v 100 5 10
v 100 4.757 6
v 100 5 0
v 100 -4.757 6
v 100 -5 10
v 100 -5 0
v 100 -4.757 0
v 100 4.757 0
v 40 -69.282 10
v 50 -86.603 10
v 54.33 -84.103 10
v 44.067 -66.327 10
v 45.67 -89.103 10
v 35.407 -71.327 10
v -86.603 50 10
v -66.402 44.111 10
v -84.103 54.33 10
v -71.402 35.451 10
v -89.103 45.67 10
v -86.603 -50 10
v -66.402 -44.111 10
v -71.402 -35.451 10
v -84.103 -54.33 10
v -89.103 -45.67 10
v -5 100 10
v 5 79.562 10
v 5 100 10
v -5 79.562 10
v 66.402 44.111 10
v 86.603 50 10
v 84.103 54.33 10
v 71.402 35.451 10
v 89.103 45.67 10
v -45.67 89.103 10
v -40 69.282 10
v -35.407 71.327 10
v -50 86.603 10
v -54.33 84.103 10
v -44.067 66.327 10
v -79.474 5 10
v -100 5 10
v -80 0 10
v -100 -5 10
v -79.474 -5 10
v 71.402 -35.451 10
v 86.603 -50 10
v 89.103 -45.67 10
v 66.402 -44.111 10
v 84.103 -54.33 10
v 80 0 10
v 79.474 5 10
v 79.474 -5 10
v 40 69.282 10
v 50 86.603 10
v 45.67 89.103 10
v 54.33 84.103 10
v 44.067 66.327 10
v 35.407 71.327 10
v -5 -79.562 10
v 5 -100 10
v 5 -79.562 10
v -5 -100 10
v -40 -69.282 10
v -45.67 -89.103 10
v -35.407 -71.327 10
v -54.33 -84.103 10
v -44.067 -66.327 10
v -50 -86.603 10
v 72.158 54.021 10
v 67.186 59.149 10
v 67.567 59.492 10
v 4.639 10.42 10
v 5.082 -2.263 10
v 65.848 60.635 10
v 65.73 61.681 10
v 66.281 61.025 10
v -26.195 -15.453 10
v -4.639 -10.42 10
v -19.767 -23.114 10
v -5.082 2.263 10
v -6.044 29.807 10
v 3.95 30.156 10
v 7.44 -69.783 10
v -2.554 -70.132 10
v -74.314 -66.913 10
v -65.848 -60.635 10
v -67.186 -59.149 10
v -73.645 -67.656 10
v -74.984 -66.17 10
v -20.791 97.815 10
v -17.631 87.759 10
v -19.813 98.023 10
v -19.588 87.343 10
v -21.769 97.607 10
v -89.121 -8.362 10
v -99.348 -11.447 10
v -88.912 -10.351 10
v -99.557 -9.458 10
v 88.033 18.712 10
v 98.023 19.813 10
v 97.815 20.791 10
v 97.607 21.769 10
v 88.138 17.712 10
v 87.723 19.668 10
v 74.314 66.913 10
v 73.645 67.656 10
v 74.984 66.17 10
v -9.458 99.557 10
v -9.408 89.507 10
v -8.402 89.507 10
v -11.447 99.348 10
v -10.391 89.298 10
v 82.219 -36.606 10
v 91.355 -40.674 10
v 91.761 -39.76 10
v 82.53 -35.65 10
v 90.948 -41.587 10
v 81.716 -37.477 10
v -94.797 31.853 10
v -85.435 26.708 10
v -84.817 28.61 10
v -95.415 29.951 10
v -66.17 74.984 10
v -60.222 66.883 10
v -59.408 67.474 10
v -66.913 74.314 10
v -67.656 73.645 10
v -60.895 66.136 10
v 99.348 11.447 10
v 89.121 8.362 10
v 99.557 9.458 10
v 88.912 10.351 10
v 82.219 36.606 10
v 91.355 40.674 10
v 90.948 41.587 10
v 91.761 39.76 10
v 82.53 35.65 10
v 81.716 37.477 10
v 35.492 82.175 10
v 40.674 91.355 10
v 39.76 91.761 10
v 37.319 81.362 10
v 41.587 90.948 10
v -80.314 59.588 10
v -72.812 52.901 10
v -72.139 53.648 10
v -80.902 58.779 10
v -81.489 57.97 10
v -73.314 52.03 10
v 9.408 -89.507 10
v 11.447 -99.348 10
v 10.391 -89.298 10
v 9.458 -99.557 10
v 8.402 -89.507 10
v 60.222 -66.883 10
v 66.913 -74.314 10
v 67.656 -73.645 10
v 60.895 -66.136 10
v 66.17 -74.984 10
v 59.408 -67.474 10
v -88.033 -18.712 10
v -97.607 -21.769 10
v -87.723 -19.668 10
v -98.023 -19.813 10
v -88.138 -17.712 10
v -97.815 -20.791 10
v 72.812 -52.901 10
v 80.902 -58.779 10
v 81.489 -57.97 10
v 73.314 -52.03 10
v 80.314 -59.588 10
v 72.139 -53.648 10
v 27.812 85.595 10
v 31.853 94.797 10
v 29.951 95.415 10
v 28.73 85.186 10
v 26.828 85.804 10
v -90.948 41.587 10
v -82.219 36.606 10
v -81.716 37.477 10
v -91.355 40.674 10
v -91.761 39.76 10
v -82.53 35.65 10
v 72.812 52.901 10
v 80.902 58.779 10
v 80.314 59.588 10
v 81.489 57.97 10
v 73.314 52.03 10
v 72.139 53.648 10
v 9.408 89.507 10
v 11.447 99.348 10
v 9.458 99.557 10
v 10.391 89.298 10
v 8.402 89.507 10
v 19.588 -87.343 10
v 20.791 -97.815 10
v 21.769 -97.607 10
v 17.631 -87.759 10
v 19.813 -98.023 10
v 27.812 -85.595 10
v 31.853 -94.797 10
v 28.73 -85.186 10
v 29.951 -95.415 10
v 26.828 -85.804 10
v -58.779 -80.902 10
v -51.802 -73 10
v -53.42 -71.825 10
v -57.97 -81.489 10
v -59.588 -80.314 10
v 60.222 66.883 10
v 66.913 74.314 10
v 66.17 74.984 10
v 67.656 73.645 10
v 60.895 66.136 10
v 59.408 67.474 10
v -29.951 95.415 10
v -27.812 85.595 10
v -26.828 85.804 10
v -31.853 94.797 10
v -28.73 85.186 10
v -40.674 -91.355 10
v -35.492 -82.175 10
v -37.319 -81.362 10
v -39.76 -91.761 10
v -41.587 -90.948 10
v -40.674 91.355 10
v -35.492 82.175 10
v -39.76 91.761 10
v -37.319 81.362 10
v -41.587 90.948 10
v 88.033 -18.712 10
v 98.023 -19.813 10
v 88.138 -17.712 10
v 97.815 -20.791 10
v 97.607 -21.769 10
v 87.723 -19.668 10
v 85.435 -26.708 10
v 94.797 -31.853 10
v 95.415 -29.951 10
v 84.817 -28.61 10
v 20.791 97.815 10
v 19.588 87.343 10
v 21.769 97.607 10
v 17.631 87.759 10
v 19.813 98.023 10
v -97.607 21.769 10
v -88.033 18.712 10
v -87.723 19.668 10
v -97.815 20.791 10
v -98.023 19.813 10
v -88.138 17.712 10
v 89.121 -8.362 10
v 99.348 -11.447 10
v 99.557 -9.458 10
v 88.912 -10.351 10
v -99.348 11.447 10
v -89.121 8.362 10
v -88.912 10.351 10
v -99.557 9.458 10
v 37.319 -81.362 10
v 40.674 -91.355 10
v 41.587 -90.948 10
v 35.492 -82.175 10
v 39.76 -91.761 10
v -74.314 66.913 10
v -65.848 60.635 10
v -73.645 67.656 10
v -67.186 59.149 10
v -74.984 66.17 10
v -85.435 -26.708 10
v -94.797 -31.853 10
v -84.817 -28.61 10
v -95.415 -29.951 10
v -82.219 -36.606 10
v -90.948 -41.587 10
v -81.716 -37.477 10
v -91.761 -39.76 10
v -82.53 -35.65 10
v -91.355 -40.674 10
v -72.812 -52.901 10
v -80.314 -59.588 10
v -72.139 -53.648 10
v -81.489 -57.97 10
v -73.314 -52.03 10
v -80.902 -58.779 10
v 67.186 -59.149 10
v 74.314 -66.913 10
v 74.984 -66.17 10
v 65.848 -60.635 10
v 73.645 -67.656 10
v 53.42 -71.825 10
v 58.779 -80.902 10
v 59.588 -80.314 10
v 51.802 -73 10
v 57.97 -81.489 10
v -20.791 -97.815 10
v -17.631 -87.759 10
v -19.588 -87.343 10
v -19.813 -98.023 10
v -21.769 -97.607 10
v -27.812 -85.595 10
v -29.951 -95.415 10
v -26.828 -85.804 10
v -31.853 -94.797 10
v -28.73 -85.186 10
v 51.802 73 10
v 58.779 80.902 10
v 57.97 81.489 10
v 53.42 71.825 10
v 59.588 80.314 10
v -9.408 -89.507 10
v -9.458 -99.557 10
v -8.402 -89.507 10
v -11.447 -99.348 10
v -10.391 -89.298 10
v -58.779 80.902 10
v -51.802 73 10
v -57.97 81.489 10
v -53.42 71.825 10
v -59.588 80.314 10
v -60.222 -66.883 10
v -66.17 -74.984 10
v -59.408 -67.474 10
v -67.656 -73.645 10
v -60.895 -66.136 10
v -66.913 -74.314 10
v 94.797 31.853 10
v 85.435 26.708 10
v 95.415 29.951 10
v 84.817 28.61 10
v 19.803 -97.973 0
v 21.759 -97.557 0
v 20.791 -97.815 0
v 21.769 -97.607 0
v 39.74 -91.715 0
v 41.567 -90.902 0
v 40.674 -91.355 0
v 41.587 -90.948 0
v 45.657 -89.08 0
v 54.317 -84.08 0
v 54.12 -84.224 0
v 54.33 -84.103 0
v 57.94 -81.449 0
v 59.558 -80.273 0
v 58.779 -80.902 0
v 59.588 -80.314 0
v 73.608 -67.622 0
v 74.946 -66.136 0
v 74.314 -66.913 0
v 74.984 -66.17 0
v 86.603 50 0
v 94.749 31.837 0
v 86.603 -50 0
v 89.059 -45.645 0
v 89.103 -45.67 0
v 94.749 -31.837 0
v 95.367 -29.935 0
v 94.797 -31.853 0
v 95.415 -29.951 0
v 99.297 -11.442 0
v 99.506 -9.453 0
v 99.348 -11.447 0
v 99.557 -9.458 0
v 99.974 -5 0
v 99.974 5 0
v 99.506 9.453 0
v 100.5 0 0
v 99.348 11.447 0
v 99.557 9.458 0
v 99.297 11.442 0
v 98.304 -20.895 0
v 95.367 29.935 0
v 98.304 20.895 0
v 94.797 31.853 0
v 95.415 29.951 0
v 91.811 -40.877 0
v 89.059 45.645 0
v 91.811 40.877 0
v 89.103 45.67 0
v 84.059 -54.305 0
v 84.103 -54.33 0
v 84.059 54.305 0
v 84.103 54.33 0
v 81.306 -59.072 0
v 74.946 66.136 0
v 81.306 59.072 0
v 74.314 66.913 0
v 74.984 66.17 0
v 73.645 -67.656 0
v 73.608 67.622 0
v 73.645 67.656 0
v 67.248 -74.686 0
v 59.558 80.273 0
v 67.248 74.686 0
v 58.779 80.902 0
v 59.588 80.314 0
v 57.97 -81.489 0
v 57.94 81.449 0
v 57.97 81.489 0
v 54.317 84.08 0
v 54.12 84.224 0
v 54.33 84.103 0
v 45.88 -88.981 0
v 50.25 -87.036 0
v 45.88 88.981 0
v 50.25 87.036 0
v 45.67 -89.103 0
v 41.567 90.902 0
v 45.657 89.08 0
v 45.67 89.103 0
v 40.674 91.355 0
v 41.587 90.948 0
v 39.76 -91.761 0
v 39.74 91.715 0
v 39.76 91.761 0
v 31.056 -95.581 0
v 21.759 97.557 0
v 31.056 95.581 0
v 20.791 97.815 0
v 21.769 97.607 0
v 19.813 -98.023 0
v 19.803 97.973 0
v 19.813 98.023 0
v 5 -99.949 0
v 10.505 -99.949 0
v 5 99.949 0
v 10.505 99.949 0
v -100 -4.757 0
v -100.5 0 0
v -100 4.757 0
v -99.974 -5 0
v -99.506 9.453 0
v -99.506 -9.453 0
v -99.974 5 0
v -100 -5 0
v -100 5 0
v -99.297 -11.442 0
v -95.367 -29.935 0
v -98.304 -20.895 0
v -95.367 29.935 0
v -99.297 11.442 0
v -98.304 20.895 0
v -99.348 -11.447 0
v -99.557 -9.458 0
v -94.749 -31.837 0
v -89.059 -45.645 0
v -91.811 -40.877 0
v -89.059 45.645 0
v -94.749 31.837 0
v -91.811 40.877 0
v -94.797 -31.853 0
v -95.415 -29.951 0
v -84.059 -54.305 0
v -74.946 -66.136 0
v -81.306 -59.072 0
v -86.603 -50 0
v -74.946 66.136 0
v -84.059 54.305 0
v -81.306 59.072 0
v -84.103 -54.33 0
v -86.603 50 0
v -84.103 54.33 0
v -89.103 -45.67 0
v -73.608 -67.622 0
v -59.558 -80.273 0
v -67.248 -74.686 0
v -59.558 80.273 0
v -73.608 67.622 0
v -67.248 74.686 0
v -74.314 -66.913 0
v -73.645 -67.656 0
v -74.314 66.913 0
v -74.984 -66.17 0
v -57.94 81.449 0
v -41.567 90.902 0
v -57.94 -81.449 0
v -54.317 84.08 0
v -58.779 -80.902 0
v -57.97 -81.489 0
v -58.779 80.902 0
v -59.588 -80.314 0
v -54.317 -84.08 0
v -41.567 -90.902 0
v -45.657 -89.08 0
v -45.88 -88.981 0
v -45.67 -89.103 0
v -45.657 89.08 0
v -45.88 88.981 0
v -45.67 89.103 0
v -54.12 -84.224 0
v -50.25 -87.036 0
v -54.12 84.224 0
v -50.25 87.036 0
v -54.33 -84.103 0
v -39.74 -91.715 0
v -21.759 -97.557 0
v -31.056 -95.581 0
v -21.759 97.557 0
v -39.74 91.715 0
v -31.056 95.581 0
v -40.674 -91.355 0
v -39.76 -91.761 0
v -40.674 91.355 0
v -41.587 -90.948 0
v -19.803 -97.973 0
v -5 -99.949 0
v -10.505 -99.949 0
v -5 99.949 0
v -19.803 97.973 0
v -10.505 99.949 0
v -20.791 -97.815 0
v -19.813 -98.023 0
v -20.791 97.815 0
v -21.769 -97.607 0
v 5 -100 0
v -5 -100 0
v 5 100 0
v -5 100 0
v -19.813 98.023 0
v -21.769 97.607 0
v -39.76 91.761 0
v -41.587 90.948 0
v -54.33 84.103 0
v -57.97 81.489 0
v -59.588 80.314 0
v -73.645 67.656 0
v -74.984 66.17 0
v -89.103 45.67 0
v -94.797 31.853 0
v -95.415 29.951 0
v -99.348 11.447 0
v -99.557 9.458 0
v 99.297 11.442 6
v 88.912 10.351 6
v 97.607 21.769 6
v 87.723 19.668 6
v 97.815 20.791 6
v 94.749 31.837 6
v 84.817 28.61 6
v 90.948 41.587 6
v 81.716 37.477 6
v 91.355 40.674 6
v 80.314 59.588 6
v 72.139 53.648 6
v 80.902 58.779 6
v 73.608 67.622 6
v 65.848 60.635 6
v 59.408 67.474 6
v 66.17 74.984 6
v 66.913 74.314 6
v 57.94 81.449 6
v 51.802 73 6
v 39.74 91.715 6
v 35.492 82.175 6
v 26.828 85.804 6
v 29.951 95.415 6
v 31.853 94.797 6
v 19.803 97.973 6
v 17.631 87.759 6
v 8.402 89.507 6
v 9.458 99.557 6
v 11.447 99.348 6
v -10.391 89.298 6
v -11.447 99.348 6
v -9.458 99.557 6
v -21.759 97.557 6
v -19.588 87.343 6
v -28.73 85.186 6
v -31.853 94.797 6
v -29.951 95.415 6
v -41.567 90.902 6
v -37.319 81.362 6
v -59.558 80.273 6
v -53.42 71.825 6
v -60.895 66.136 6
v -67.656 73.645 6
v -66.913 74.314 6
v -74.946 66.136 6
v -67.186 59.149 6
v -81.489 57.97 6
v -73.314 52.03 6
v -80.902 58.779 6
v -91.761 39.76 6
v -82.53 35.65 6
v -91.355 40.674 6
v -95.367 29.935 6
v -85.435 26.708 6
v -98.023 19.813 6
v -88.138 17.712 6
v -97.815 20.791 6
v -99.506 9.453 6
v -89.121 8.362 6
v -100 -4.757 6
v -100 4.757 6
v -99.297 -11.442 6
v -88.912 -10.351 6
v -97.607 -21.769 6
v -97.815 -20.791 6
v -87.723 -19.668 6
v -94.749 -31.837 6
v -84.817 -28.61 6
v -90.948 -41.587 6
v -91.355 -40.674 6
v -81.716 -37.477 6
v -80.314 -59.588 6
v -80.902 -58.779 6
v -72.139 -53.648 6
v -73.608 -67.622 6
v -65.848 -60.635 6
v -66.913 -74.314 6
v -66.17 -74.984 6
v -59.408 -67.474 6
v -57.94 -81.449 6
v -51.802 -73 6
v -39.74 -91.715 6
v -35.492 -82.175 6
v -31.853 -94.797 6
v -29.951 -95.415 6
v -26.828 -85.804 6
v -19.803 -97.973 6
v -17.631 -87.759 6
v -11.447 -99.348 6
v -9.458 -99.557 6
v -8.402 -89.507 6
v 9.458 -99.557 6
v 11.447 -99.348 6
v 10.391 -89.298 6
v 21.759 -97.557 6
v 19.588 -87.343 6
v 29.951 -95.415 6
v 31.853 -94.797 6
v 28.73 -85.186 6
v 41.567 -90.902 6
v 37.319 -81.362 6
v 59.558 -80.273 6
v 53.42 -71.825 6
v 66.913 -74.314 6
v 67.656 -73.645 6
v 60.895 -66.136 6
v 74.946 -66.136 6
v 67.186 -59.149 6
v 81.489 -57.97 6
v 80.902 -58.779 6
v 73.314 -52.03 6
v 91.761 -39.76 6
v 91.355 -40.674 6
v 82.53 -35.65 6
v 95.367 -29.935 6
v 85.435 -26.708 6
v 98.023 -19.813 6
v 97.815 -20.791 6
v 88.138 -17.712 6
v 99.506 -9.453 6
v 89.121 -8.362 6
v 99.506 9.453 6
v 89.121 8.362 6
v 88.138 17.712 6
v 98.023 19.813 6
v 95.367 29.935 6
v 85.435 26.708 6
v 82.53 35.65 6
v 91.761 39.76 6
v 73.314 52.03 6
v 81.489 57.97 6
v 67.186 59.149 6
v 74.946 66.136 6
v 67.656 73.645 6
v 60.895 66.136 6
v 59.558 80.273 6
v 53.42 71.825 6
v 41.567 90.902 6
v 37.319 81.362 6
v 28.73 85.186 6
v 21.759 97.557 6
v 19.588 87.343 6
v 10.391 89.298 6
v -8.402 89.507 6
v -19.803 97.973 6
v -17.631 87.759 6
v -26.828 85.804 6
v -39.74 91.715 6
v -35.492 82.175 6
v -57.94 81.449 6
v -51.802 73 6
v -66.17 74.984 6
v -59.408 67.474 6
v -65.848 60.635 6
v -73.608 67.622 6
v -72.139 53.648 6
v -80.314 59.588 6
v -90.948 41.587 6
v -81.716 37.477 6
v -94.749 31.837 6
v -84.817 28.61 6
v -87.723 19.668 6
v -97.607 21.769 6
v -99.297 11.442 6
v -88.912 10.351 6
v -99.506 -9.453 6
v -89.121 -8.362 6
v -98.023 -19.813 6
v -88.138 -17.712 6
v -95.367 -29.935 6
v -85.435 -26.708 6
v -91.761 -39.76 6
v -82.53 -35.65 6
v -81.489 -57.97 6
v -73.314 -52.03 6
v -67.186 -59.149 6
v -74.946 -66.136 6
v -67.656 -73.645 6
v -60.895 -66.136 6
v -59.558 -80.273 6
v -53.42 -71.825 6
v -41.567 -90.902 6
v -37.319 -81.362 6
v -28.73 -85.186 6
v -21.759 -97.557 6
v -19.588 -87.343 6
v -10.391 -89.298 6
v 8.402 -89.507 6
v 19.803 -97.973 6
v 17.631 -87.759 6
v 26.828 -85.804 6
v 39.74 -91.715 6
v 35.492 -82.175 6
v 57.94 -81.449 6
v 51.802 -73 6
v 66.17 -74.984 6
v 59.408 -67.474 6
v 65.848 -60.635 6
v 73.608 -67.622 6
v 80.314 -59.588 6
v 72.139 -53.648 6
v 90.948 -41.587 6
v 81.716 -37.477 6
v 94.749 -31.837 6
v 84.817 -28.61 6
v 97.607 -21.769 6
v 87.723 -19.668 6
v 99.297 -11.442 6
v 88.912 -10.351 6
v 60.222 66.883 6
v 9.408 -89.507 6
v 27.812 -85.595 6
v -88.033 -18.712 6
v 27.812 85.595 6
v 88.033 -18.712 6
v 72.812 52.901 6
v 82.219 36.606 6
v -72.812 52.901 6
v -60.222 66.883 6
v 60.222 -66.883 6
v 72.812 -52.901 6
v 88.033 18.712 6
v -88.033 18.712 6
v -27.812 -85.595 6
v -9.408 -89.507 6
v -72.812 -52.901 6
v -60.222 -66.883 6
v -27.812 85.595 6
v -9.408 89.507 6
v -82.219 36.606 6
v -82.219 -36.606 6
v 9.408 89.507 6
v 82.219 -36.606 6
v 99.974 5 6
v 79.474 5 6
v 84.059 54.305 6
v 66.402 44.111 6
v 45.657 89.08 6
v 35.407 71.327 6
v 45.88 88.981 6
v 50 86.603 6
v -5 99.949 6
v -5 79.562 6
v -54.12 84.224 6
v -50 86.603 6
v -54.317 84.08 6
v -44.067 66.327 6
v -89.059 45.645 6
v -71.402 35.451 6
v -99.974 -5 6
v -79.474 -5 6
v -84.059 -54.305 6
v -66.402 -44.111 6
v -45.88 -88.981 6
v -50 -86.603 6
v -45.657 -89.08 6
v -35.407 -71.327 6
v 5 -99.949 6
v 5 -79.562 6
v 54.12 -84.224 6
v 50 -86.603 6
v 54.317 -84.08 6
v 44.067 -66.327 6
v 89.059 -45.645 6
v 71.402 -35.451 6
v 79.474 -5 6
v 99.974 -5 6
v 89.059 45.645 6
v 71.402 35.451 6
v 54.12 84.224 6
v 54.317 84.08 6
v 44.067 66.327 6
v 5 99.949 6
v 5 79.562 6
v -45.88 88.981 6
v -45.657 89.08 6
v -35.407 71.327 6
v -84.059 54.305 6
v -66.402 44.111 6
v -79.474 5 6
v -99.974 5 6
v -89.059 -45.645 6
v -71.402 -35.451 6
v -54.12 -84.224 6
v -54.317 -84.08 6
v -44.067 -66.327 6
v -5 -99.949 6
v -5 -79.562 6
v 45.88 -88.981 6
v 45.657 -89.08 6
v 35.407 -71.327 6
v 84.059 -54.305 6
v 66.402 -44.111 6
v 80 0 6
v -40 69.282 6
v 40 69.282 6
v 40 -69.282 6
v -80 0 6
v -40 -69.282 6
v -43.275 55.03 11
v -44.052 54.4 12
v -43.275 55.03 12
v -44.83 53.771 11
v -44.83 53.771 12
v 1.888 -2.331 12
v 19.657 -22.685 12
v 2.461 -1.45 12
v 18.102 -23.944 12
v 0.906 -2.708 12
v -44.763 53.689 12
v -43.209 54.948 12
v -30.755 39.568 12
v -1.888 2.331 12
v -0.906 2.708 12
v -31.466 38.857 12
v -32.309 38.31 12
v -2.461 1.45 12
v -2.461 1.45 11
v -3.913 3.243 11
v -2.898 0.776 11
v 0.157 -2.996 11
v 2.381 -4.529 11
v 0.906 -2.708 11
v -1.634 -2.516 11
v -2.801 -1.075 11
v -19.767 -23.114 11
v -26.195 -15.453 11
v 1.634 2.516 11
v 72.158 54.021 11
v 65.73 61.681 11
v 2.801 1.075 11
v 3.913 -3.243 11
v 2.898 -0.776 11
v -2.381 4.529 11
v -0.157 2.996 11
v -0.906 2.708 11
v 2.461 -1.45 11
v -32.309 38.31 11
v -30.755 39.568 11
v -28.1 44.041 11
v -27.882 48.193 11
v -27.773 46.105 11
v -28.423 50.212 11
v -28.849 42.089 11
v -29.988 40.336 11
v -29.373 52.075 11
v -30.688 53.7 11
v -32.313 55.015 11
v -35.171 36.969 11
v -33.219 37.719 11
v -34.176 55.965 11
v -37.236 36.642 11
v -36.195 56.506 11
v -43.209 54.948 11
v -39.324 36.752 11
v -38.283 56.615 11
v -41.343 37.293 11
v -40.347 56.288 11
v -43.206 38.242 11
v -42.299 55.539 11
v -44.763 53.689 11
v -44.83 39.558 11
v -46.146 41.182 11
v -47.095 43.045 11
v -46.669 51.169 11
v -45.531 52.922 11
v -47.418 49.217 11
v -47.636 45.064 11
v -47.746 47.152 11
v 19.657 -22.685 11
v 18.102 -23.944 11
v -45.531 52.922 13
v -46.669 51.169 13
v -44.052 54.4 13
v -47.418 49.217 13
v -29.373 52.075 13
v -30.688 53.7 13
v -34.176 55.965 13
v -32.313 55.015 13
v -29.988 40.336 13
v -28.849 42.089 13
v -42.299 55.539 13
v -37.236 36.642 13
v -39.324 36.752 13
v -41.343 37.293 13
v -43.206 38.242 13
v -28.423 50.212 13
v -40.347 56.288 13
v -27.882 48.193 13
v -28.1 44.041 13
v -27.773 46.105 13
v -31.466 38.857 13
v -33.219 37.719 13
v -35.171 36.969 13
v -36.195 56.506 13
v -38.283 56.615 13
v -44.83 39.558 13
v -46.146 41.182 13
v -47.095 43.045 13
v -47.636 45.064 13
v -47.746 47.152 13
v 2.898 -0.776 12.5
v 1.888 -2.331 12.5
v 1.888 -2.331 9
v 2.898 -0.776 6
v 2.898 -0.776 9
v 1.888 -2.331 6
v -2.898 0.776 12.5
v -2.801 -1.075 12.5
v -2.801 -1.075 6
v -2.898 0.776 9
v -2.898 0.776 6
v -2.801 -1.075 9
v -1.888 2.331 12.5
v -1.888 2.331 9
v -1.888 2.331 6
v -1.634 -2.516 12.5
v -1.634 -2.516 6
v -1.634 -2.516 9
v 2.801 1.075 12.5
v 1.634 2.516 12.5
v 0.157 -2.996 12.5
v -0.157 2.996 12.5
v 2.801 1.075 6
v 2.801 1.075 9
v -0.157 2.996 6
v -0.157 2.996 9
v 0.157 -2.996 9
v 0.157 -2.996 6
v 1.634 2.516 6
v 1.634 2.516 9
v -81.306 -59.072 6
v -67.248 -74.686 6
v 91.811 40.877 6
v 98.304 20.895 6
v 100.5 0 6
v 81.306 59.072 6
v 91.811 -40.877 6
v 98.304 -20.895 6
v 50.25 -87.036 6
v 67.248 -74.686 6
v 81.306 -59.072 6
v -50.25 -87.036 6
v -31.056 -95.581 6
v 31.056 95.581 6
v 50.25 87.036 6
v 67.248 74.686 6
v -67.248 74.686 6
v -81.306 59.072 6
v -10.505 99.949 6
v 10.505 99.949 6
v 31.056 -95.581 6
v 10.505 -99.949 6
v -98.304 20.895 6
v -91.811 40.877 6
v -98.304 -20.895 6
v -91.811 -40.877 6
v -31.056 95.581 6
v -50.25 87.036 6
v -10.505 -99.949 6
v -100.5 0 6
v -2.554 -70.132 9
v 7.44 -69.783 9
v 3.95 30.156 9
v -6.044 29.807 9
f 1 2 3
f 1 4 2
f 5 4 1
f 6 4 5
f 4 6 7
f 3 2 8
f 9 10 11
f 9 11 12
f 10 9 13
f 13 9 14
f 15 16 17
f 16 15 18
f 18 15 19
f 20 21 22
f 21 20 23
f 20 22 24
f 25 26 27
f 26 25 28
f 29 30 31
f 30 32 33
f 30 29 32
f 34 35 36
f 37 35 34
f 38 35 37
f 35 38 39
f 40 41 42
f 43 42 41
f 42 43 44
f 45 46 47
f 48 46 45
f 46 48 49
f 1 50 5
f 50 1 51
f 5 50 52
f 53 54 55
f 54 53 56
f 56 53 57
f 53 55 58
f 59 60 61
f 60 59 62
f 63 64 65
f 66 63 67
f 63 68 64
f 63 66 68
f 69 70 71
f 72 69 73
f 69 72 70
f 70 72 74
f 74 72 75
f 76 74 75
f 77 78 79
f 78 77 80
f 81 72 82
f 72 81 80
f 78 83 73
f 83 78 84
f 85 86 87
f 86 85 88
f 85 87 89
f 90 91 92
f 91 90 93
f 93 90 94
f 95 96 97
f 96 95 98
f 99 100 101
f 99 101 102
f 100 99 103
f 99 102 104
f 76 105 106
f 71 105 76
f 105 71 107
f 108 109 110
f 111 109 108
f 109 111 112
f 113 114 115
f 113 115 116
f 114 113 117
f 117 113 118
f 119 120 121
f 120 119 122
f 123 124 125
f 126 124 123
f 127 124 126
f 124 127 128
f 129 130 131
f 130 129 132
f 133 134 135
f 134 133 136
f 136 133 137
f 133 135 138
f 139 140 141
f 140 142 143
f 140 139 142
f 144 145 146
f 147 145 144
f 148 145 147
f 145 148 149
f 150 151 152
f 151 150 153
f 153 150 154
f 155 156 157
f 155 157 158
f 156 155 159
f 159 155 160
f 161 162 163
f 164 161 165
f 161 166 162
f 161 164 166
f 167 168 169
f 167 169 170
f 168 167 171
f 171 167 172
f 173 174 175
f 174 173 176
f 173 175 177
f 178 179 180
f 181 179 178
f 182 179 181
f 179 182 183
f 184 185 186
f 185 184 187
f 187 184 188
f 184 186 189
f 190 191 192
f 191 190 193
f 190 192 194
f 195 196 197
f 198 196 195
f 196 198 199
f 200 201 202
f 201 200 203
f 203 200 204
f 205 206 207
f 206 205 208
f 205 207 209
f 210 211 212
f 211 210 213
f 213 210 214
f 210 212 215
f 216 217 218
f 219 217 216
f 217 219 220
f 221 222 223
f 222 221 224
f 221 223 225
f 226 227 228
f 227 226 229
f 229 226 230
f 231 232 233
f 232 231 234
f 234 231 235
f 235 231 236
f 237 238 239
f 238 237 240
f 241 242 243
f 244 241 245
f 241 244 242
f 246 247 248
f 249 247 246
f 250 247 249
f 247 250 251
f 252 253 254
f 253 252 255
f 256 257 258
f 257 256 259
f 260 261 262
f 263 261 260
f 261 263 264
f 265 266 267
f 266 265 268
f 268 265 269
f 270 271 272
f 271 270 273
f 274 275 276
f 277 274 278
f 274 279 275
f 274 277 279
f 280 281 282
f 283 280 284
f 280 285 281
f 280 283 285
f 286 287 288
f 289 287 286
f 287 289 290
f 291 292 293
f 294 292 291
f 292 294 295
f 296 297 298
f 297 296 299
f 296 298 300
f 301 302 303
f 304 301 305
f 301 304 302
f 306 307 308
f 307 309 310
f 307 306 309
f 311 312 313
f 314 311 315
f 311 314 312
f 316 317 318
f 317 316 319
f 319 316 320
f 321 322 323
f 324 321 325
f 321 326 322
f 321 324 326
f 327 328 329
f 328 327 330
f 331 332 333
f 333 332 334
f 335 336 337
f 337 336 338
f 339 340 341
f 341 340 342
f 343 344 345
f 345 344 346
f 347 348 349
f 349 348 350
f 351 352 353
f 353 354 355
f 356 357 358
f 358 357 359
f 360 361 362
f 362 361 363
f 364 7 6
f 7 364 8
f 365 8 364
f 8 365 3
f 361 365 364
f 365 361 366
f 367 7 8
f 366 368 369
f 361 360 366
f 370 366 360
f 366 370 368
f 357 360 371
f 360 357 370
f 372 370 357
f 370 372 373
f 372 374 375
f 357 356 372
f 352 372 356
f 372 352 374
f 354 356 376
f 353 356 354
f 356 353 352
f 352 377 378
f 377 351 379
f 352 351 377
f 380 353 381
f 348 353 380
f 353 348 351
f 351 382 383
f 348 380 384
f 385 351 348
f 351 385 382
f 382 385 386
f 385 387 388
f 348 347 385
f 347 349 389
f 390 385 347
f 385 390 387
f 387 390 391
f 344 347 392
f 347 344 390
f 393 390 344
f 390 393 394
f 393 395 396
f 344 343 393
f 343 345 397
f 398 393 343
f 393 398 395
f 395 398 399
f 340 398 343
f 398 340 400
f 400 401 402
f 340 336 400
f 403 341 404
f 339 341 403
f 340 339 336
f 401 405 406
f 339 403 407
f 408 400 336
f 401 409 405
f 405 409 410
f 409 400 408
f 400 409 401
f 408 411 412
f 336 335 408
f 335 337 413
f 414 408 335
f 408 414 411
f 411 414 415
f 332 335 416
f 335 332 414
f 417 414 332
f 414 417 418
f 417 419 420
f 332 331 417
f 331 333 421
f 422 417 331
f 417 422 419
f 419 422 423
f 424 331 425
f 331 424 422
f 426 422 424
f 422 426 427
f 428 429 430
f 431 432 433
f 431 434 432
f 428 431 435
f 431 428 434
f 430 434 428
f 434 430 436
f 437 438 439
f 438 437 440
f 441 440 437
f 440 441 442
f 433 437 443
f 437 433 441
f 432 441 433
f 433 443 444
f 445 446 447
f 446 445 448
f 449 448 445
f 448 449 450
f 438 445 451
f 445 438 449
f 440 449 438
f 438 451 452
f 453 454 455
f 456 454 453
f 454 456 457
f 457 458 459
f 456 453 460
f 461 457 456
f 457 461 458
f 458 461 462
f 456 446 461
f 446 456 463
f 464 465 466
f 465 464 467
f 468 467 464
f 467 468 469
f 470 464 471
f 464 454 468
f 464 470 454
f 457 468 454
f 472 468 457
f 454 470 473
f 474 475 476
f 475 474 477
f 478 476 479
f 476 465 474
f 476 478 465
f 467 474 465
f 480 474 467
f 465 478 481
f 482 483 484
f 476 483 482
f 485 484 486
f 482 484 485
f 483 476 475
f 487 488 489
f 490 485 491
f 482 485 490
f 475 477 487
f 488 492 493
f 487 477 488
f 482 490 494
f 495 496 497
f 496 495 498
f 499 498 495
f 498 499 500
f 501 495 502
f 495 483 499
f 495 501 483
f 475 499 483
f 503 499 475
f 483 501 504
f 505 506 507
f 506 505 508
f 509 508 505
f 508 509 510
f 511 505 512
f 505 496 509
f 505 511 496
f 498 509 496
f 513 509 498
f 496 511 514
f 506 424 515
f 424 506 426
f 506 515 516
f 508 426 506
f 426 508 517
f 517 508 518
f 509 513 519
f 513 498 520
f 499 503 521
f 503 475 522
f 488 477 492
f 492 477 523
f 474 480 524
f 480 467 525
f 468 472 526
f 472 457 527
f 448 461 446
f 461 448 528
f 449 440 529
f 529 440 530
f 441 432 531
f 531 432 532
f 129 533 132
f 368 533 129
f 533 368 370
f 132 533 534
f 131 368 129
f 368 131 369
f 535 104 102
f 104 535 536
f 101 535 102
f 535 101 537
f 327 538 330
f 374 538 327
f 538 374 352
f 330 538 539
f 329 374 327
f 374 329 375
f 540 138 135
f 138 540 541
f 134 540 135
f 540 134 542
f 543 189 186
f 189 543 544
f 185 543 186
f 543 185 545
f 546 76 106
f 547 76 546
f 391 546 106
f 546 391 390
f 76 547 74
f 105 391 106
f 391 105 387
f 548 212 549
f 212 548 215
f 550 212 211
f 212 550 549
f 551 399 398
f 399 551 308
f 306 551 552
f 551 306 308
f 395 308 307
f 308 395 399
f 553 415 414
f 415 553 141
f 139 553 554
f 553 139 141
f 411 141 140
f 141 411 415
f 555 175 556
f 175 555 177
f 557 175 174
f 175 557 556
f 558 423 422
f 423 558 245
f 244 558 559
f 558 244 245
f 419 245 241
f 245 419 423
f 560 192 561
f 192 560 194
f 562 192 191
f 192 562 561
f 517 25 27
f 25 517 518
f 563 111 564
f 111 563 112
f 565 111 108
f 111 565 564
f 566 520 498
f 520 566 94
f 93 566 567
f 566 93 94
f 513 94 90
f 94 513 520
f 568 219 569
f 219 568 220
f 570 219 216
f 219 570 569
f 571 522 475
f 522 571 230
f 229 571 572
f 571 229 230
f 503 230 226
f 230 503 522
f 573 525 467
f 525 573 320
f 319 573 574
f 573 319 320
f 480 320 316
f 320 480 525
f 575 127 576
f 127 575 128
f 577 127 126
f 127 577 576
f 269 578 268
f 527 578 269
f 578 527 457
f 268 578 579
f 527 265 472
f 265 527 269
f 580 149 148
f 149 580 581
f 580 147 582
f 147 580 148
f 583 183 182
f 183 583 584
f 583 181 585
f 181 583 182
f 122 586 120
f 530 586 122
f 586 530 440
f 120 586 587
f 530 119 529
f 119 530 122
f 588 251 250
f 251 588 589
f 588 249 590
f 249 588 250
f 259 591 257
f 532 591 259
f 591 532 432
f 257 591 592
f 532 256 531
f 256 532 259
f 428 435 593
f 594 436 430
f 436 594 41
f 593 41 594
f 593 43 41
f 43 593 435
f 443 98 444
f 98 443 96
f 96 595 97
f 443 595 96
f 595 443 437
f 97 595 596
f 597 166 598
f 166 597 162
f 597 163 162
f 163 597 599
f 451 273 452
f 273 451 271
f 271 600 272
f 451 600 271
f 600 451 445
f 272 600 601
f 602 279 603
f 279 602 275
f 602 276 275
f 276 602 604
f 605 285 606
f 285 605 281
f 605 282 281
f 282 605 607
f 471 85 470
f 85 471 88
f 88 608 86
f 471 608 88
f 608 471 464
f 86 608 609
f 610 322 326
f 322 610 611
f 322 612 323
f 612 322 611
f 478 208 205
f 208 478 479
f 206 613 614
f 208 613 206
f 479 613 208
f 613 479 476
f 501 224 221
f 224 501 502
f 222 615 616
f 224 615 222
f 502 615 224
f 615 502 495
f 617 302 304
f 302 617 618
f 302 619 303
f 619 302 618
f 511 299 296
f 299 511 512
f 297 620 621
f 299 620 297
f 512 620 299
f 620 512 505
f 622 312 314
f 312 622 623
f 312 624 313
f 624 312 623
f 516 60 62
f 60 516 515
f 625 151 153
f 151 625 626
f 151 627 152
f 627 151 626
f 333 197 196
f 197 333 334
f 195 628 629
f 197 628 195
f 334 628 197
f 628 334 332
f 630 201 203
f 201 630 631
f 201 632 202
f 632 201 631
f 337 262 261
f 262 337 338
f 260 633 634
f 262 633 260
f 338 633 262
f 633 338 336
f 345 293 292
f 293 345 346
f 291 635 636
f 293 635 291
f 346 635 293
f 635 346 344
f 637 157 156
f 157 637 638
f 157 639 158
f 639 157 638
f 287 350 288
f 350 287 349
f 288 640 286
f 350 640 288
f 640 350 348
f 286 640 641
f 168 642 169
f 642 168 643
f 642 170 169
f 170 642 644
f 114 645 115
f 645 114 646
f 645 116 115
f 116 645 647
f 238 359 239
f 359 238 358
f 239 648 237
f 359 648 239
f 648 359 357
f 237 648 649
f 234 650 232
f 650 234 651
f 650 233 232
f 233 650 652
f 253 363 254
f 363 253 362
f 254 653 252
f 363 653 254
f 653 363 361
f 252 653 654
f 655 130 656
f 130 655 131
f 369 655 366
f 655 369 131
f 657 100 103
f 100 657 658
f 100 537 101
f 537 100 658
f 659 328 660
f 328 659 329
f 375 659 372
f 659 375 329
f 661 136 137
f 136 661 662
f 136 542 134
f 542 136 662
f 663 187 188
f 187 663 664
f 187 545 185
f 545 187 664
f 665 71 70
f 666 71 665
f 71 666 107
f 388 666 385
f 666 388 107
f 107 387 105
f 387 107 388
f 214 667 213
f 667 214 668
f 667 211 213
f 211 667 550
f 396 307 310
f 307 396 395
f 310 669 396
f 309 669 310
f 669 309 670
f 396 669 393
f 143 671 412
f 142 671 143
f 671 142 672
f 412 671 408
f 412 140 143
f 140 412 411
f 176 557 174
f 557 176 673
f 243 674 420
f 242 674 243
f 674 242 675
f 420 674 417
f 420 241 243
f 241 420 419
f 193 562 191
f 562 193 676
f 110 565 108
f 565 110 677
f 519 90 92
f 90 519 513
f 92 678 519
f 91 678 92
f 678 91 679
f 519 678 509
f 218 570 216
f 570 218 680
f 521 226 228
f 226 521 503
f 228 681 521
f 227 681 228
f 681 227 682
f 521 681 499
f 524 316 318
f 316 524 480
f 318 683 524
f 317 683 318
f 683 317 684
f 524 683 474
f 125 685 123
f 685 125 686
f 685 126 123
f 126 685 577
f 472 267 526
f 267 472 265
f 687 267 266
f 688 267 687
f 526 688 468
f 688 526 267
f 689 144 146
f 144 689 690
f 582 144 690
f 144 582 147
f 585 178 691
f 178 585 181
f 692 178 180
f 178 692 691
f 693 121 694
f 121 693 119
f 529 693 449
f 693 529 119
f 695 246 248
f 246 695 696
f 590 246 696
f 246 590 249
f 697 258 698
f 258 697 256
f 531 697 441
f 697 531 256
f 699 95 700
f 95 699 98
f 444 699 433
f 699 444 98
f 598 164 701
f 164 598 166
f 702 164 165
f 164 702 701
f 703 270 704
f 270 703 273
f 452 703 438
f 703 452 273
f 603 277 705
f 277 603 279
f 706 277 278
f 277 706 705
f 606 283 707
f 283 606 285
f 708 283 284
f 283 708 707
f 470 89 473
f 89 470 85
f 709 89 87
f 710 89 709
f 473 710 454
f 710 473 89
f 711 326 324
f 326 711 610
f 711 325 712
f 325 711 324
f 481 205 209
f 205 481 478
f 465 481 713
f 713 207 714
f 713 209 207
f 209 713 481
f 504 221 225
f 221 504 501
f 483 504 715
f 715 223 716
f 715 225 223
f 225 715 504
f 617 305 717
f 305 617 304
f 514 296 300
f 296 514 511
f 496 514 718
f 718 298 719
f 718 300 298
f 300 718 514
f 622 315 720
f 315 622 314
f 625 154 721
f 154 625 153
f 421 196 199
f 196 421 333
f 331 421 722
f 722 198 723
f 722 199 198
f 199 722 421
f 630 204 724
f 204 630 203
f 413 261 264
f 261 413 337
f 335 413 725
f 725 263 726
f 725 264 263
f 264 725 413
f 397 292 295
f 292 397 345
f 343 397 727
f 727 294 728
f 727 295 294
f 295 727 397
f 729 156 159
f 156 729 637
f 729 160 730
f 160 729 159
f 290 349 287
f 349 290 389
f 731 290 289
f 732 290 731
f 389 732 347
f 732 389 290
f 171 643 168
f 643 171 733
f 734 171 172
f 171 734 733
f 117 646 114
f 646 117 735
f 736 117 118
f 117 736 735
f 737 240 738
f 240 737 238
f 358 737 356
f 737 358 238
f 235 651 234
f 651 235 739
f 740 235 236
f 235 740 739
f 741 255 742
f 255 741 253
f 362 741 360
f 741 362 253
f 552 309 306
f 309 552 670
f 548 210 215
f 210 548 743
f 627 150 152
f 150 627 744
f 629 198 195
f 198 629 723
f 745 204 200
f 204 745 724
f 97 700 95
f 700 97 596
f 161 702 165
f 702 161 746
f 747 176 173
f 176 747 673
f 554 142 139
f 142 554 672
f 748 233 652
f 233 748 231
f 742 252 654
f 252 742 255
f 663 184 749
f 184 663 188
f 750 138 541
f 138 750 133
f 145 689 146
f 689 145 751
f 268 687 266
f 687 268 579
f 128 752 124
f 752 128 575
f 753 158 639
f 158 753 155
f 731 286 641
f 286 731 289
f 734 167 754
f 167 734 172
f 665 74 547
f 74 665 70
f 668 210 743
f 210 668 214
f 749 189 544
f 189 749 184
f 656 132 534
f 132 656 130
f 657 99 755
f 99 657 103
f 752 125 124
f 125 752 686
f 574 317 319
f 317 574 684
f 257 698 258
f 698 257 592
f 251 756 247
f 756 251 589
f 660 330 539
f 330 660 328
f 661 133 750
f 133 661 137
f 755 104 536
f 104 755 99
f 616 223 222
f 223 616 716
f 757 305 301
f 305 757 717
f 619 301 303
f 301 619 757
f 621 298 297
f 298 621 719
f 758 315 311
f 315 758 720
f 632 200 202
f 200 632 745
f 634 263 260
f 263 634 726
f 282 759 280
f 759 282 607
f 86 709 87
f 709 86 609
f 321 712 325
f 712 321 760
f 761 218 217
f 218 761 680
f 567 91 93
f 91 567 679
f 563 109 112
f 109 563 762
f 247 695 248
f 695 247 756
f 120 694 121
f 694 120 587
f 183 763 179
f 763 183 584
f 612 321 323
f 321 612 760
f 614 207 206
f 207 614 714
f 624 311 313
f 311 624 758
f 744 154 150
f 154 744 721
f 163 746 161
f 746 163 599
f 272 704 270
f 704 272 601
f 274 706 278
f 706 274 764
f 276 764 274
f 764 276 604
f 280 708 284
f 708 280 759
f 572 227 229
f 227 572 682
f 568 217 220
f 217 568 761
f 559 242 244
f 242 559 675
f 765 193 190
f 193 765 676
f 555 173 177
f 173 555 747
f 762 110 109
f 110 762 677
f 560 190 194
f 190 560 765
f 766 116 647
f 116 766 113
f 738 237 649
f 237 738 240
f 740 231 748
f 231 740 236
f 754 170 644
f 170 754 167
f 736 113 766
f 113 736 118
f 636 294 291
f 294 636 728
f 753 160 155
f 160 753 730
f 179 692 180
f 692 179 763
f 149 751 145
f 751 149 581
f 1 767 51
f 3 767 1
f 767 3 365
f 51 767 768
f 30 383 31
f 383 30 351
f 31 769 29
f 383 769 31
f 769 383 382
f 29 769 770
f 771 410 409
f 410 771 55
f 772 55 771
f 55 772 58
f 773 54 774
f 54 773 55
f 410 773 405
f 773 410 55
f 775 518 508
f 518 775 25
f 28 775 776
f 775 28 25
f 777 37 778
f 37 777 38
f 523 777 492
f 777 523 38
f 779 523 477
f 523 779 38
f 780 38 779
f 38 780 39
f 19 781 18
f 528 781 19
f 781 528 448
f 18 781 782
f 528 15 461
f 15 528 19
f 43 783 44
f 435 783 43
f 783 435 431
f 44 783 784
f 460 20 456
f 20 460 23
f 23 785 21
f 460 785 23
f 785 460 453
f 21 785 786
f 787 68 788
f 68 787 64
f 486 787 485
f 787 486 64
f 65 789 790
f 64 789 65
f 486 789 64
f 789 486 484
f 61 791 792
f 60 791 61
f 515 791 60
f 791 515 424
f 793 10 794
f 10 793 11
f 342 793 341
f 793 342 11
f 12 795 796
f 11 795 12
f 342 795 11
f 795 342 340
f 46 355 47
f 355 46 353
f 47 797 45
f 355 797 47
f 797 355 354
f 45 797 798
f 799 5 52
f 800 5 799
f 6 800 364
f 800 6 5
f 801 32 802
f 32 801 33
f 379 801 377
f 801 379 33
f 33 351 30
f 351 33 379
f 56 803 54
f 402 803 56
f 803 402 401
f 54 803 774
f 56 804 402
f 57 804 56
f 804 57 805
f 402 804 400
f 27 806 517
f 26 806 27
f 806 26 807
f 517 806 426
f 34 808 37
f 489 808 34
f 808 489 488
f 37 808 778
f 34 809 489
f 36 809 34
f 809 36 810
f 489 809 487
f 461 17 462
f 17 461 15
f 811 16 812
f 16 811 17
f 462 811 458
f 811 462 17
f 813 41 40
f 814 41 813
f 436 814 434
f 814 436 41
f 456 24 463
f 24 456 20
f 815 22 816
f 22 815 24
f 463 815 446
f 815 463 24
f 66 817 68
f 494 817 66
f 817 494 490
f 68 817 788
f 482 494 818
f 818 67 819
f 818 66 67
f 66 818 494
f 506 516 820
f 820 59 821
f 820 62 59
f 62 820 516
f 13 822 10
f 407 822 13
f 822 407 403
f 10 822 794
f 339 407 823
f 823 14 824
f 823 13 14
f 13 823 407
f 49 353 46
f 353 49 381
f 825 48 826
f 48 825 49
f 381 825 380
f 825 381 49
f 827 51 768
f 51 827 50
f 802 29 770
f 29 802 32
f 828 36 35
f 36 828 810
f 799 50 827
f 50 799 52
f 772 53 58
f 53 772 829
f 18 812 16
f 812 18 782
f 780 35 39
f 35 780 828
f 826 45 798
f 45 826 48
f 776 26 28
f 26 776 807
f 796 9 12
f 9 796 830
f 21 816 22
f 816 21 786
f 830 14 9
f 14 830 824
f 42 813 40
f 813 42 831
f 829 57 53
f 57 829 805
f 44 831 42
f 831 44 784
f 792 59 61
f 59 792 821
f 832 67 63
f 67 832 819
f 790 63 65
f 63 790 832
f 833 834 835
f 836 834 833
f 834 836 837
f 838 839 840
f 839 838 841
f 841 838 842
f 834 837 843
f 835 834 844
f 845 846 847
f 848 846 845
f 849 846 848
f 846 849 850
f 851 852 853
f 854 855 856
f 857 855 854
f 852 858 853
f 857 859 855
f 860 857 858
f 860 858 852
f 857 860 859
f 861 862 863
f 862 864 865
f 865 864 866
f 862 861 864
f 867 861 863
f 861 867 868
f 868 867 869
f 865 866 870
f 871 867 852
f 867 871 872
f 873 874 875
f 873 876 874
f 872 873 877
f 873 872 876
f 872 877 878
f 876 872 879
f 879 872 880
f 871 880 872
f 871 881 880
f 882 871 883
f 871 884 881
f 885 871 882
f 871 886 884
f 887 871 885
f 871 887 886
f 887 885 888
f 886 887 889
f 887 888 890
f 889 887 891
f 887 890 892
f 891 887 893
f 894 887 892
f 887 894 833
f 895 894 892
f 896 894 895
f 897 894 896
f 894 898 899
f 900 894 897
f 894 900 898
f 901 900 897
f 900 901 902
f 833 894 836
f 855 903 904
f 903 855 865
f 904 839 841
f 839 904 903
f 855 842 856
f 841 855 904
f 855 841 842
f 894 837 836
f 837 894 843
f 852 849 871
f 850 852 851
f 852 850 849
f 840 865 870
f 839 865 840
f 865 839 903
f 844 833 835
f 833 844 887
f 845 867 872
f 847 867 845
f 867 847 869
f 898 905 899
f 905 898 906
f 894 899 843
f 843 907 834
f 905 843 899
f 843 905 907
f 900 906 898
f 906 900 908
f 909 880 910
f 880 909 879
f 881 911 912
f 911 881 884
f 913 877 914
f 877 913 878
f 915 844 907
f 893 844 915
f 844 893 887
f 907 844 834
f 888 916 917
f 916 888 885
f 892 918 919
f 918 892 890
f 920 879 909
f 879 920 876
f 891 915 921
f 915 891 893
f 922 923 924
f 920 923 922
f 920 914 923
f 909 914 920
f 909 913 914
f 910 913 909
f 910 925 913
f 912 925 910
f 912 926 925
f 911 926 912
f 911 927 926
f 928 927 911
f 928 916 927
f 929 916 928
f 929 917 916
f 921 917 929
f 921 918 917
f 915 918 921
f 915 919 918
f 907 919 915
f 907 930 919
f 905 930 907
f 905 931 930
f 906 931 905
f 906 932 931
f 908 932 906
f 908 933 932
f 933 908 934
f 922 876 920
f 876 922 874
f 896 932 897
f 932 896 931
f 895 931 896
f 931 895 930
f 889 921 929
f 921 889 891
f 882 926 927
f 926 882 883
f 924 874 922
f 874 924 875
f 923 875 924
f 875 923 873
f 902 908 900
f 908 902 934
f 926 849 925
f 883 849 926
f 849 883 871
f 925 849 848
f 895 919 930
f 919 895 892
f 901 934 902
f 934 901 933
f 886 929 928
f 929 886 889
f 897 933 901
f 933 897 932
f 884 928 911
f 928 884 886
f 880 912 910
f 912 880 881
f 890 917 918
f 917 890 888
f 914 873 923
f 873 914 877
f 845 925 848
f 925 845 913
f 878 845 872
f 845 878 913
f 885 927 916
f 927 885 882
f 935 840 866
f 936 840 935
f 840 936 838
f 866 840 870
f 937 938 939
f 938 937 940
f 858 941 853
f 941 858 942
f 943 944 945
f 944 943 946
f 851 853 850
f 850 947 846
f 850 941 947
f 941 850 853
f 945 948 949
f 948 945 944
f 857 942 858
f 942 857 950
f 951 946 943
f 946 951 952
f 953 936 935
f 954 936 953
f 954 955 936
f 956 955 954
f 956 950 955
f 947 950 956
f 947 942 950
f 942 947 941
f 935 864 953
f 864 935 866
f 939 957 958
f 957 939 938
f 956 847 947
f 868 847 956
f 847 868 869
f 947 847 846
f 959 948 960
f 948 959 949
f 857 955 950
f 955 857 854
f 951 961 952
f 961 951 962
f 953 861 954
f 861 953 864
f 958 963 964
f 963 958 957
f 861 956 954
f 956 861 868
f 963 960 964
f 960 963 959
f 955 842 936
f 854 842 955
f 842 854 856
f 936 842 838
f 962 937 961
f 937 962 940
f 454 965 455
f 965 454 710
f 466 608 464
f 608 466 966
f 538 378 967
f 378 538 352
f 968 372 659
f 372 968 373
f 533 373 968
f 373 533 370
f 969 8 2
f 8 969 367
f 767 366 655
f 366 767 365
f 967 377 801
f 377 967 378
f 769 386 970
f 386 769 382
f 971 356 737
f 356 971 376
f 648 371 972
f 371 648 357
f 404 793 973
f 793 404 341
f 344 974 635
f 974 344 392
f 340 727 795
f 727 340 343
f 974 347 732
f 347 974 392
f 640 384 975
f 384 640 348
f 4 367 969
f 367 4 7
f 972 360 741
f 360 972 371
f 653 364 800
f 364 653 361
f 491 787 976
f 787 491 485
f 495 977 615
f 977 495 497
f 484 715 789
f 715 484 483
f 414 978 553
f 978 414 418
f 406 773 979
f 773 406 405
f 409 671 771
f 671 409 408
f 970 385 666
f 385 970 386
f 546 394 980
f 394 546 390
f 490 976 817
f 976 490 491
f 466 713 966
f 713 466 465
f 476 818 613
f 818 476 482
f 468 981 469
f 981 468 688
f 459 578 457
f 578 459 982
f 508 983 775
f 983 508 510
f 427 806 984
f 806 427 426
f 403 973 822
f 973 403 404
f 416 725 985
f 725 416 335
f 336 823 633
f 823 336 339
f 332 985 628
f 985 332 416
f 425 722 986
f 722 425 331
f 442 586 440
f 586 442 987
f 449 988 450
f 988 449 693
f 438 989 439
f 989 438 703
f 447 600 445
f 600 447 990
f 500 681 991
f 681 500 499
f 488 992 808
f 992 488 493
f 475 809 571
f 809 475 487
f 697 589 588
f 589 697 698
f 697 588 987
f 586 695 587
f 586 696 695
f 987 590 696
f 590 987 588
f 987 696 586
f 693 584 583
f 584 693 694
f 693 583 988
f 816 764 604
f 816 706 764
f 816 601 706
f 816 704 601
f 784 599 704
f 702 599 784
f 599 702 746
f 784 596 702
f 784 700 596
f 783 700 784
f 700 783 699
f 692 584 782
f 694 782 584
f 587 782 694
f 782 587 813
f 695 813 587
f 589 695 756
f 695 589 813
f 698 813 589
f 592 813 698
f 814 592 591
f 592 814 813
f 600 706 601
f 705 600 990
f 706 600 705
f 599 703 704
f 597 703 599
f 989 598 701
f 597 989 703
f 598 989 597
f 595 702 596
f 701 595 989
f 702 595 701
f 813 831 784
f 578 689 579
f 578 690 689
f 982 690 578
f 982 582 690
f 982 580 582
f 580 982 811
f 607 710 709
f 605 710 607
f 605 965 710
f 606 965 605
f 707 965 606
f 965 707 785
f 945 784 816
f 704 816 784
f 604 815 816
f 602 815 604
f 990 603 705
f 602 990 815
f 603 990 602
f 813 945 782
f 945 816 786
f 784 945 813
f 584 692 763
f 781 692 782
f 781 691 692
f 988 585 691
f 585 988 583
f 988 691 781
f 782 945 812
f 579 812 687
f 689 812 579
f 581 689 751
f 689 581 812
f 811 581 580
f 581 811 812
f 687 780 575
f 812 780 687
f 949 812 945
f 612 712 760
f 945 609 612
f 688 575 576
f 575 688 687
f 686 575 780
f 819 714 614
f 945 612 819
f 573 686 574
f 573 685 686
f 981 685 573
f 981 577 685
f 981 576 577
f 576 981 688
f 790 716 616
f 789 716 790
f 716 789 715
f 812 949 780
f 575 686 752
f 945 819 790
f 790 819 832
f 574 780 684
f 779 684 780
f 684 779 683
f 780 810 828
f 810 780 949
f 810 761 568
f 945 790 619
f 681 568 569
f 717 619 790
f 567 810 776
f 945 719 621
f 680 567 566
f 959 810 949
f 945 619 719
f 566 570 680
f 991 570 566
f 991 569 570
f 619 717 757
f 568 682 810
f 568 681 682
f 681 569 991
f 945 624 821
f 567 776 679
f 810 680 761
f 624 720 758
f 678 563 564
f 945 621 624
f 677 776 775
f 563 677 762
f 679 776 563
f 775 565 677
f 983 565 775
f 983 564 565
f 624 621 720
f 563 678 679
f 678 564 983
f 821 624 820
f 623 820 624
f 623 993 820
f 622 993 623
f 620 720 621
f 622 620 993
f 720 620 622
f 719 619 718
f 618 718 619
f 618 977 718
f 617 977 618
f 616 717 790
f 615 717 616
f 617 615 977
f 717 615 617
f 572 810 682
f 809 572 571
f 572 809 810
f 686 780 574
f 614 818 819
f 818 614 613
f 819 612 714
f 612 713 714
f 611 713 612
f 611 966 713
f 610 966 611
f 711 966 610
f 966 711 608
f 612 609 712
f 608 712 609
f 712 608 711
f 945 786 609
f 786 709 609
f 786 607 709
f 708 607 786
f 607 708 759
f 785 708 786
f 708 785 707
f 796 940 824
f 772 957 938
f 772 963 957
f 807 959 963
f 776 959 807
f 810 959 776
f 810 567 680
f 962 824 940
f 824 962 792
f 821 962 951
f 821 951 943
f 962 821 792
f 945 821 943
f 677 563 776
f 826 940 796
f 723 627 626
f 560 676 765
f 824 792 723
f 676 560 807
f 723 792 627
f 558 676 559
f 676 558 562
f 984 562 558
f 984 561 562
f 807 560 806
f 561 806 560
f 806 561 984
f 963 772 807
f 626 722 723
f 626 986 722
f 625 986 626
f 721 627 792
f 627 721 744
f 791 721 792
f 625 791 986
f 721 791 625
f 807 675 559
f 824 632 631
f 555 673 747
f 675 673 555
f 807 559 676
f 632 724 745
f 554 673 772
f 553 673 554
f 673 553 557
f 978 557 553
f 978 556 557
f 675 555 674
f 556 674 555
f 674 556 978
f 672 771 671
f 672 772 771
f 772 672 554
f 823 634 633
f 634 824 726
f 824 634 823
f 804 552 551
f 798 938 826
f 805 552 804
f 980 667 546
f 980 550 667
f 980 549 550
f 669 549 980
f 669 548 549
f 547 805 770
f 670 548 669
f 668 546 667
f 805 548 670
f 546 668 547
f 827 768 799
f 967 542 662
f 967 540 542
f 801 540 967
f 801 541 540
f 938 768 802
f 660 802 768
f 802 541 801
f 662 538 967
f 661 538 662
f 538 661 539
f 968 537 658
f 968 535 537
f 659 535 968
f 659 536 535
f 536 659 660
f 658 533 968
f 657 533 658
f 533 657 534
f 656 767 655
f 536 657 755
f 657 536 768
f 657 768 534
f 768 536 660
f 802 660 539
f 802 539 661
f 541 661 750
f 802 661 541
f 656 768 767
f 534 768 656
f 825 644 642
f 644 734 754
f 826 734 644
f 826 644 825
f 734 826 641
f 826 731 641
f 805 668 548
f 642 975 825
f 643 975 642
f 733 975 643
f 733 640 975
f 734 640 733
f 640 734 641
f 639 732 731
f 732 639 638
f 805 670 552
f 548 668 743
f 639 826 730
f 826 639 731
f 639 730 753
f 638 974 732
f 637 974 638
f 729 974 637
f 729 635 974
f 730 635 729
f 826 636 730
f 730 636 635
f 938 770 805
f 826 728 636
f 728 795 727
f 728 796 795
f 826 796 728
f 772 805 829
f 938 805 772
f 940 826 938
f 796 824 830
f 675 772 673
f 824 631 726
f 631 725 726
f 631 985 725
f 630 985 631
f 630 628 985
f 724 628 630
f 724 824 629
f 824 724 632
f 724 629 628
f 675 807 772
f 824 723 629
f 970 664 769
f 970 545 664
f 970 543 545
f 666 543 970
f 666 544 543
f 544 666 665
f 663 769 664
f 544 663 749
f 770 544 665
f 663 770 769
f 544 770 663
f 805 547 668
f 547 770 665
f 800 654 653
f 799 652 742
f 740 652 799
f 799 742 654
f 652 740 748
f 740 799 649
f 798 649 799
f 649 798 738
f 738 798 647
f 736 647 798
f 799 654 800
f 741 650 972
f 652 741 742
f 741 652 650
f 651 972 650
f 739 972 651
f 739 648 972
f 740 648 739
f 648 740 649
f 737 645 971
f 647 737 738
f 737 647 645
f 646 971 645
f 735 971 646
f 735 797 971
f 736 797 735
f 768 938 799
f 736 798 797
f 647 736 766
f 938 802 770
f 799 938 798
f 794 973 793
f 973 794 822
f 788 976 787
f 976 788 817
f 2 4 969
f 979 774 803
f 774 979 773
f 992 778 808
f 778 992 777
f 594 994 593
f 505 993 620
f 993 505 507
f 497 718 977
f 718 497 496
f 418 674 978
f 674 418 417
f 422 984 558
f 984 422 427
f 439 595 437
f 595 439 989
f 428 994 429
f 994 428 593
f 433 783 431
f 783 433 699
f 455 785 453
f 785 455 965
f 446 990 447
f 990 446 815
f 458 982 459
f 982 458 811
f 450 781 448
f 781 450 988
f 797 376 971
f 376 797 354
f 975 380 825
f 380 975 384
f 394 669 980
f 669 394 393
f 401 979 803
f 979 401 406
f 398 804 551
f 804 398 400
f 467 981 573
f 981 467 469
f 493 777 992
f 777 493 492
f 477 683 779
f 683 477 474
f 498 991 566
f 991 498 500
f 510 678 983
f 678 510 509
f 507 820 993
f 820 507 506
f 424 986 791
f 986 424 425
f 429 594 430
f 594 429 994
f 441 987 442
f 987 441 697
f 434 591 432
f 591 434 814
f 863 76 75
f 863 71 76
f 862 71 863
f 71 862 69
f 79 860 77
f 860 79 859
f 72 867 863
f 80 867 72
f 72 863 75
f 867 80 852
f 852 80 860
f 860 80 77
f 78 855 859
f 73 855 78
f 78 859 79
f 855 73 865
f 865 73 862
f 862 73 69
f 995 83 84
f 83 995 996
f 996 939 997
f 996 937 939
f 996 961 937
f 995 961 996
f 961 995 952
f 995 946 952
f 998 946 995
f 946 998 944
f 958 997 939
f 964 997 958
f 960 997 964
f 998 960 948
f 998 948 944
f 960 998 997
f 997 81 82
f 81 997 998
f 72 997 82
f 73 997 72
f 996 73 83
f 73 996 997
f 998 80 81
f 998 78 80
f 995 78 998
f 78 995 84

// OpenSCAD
//cylinder(10,100,100);
module big() {
    for(x =[0:11]){
        translate([0,0,0])
        rotate([0,0,x*30])    
        cube([100,5,10]);   
        
    };

    for(x =[0:11]){
        
        rotate([0,0,x*30])  
        translate([0,-5,0])  
        cube([100,5,10]);   
        
    };
};

module small() {
    for(x =[0:60]){
        translate([0,0,0])
        rotate([0,0,x*6])    
        cube([100,1,10]);   
        
    };

    for(x =[0:60]){
        
        rotate([0,0,x*6])  
        translate([0,-1,0])  
        cube([100,1,10]);   
        
    };
};

module small_diff() {
    difference() {    
        small();
        translate([0,0,-10])
        cylinder(30,90,90);    
    };
};

module big_diff() {
    difference() {    
        big();
        translate([0,0,-10])
        cylinder(30,80,80);    
    };
};

module seconder() {
    translate([-30,-1,11])
    cube([100,2,1]);
    translate([60,0,11])
    cylinder(2,10,10);
    cylinder(12.5,3,3);
};

module seconder_rotate(x) {
    rotate([0,0,x])
    seconder();
    
};

module minuter() {
    translate([-30,-5,10])
    cube([120,10,1]);
};

module minuter_rotate(x) {
    rotate([0,0,x])
    minuter();    
};

module hour() {
    translate([-30,-5,9])
    cube([100,10,1]);
};

module hour_rotate(x) {
    rotate([0,0,x])
    hour();    
};

small_diff();
big_diff();
cylinder(6,100.5,100.5);
seconder_rotate(129);
minuter_rotate(40);
hour_rotate(272);
